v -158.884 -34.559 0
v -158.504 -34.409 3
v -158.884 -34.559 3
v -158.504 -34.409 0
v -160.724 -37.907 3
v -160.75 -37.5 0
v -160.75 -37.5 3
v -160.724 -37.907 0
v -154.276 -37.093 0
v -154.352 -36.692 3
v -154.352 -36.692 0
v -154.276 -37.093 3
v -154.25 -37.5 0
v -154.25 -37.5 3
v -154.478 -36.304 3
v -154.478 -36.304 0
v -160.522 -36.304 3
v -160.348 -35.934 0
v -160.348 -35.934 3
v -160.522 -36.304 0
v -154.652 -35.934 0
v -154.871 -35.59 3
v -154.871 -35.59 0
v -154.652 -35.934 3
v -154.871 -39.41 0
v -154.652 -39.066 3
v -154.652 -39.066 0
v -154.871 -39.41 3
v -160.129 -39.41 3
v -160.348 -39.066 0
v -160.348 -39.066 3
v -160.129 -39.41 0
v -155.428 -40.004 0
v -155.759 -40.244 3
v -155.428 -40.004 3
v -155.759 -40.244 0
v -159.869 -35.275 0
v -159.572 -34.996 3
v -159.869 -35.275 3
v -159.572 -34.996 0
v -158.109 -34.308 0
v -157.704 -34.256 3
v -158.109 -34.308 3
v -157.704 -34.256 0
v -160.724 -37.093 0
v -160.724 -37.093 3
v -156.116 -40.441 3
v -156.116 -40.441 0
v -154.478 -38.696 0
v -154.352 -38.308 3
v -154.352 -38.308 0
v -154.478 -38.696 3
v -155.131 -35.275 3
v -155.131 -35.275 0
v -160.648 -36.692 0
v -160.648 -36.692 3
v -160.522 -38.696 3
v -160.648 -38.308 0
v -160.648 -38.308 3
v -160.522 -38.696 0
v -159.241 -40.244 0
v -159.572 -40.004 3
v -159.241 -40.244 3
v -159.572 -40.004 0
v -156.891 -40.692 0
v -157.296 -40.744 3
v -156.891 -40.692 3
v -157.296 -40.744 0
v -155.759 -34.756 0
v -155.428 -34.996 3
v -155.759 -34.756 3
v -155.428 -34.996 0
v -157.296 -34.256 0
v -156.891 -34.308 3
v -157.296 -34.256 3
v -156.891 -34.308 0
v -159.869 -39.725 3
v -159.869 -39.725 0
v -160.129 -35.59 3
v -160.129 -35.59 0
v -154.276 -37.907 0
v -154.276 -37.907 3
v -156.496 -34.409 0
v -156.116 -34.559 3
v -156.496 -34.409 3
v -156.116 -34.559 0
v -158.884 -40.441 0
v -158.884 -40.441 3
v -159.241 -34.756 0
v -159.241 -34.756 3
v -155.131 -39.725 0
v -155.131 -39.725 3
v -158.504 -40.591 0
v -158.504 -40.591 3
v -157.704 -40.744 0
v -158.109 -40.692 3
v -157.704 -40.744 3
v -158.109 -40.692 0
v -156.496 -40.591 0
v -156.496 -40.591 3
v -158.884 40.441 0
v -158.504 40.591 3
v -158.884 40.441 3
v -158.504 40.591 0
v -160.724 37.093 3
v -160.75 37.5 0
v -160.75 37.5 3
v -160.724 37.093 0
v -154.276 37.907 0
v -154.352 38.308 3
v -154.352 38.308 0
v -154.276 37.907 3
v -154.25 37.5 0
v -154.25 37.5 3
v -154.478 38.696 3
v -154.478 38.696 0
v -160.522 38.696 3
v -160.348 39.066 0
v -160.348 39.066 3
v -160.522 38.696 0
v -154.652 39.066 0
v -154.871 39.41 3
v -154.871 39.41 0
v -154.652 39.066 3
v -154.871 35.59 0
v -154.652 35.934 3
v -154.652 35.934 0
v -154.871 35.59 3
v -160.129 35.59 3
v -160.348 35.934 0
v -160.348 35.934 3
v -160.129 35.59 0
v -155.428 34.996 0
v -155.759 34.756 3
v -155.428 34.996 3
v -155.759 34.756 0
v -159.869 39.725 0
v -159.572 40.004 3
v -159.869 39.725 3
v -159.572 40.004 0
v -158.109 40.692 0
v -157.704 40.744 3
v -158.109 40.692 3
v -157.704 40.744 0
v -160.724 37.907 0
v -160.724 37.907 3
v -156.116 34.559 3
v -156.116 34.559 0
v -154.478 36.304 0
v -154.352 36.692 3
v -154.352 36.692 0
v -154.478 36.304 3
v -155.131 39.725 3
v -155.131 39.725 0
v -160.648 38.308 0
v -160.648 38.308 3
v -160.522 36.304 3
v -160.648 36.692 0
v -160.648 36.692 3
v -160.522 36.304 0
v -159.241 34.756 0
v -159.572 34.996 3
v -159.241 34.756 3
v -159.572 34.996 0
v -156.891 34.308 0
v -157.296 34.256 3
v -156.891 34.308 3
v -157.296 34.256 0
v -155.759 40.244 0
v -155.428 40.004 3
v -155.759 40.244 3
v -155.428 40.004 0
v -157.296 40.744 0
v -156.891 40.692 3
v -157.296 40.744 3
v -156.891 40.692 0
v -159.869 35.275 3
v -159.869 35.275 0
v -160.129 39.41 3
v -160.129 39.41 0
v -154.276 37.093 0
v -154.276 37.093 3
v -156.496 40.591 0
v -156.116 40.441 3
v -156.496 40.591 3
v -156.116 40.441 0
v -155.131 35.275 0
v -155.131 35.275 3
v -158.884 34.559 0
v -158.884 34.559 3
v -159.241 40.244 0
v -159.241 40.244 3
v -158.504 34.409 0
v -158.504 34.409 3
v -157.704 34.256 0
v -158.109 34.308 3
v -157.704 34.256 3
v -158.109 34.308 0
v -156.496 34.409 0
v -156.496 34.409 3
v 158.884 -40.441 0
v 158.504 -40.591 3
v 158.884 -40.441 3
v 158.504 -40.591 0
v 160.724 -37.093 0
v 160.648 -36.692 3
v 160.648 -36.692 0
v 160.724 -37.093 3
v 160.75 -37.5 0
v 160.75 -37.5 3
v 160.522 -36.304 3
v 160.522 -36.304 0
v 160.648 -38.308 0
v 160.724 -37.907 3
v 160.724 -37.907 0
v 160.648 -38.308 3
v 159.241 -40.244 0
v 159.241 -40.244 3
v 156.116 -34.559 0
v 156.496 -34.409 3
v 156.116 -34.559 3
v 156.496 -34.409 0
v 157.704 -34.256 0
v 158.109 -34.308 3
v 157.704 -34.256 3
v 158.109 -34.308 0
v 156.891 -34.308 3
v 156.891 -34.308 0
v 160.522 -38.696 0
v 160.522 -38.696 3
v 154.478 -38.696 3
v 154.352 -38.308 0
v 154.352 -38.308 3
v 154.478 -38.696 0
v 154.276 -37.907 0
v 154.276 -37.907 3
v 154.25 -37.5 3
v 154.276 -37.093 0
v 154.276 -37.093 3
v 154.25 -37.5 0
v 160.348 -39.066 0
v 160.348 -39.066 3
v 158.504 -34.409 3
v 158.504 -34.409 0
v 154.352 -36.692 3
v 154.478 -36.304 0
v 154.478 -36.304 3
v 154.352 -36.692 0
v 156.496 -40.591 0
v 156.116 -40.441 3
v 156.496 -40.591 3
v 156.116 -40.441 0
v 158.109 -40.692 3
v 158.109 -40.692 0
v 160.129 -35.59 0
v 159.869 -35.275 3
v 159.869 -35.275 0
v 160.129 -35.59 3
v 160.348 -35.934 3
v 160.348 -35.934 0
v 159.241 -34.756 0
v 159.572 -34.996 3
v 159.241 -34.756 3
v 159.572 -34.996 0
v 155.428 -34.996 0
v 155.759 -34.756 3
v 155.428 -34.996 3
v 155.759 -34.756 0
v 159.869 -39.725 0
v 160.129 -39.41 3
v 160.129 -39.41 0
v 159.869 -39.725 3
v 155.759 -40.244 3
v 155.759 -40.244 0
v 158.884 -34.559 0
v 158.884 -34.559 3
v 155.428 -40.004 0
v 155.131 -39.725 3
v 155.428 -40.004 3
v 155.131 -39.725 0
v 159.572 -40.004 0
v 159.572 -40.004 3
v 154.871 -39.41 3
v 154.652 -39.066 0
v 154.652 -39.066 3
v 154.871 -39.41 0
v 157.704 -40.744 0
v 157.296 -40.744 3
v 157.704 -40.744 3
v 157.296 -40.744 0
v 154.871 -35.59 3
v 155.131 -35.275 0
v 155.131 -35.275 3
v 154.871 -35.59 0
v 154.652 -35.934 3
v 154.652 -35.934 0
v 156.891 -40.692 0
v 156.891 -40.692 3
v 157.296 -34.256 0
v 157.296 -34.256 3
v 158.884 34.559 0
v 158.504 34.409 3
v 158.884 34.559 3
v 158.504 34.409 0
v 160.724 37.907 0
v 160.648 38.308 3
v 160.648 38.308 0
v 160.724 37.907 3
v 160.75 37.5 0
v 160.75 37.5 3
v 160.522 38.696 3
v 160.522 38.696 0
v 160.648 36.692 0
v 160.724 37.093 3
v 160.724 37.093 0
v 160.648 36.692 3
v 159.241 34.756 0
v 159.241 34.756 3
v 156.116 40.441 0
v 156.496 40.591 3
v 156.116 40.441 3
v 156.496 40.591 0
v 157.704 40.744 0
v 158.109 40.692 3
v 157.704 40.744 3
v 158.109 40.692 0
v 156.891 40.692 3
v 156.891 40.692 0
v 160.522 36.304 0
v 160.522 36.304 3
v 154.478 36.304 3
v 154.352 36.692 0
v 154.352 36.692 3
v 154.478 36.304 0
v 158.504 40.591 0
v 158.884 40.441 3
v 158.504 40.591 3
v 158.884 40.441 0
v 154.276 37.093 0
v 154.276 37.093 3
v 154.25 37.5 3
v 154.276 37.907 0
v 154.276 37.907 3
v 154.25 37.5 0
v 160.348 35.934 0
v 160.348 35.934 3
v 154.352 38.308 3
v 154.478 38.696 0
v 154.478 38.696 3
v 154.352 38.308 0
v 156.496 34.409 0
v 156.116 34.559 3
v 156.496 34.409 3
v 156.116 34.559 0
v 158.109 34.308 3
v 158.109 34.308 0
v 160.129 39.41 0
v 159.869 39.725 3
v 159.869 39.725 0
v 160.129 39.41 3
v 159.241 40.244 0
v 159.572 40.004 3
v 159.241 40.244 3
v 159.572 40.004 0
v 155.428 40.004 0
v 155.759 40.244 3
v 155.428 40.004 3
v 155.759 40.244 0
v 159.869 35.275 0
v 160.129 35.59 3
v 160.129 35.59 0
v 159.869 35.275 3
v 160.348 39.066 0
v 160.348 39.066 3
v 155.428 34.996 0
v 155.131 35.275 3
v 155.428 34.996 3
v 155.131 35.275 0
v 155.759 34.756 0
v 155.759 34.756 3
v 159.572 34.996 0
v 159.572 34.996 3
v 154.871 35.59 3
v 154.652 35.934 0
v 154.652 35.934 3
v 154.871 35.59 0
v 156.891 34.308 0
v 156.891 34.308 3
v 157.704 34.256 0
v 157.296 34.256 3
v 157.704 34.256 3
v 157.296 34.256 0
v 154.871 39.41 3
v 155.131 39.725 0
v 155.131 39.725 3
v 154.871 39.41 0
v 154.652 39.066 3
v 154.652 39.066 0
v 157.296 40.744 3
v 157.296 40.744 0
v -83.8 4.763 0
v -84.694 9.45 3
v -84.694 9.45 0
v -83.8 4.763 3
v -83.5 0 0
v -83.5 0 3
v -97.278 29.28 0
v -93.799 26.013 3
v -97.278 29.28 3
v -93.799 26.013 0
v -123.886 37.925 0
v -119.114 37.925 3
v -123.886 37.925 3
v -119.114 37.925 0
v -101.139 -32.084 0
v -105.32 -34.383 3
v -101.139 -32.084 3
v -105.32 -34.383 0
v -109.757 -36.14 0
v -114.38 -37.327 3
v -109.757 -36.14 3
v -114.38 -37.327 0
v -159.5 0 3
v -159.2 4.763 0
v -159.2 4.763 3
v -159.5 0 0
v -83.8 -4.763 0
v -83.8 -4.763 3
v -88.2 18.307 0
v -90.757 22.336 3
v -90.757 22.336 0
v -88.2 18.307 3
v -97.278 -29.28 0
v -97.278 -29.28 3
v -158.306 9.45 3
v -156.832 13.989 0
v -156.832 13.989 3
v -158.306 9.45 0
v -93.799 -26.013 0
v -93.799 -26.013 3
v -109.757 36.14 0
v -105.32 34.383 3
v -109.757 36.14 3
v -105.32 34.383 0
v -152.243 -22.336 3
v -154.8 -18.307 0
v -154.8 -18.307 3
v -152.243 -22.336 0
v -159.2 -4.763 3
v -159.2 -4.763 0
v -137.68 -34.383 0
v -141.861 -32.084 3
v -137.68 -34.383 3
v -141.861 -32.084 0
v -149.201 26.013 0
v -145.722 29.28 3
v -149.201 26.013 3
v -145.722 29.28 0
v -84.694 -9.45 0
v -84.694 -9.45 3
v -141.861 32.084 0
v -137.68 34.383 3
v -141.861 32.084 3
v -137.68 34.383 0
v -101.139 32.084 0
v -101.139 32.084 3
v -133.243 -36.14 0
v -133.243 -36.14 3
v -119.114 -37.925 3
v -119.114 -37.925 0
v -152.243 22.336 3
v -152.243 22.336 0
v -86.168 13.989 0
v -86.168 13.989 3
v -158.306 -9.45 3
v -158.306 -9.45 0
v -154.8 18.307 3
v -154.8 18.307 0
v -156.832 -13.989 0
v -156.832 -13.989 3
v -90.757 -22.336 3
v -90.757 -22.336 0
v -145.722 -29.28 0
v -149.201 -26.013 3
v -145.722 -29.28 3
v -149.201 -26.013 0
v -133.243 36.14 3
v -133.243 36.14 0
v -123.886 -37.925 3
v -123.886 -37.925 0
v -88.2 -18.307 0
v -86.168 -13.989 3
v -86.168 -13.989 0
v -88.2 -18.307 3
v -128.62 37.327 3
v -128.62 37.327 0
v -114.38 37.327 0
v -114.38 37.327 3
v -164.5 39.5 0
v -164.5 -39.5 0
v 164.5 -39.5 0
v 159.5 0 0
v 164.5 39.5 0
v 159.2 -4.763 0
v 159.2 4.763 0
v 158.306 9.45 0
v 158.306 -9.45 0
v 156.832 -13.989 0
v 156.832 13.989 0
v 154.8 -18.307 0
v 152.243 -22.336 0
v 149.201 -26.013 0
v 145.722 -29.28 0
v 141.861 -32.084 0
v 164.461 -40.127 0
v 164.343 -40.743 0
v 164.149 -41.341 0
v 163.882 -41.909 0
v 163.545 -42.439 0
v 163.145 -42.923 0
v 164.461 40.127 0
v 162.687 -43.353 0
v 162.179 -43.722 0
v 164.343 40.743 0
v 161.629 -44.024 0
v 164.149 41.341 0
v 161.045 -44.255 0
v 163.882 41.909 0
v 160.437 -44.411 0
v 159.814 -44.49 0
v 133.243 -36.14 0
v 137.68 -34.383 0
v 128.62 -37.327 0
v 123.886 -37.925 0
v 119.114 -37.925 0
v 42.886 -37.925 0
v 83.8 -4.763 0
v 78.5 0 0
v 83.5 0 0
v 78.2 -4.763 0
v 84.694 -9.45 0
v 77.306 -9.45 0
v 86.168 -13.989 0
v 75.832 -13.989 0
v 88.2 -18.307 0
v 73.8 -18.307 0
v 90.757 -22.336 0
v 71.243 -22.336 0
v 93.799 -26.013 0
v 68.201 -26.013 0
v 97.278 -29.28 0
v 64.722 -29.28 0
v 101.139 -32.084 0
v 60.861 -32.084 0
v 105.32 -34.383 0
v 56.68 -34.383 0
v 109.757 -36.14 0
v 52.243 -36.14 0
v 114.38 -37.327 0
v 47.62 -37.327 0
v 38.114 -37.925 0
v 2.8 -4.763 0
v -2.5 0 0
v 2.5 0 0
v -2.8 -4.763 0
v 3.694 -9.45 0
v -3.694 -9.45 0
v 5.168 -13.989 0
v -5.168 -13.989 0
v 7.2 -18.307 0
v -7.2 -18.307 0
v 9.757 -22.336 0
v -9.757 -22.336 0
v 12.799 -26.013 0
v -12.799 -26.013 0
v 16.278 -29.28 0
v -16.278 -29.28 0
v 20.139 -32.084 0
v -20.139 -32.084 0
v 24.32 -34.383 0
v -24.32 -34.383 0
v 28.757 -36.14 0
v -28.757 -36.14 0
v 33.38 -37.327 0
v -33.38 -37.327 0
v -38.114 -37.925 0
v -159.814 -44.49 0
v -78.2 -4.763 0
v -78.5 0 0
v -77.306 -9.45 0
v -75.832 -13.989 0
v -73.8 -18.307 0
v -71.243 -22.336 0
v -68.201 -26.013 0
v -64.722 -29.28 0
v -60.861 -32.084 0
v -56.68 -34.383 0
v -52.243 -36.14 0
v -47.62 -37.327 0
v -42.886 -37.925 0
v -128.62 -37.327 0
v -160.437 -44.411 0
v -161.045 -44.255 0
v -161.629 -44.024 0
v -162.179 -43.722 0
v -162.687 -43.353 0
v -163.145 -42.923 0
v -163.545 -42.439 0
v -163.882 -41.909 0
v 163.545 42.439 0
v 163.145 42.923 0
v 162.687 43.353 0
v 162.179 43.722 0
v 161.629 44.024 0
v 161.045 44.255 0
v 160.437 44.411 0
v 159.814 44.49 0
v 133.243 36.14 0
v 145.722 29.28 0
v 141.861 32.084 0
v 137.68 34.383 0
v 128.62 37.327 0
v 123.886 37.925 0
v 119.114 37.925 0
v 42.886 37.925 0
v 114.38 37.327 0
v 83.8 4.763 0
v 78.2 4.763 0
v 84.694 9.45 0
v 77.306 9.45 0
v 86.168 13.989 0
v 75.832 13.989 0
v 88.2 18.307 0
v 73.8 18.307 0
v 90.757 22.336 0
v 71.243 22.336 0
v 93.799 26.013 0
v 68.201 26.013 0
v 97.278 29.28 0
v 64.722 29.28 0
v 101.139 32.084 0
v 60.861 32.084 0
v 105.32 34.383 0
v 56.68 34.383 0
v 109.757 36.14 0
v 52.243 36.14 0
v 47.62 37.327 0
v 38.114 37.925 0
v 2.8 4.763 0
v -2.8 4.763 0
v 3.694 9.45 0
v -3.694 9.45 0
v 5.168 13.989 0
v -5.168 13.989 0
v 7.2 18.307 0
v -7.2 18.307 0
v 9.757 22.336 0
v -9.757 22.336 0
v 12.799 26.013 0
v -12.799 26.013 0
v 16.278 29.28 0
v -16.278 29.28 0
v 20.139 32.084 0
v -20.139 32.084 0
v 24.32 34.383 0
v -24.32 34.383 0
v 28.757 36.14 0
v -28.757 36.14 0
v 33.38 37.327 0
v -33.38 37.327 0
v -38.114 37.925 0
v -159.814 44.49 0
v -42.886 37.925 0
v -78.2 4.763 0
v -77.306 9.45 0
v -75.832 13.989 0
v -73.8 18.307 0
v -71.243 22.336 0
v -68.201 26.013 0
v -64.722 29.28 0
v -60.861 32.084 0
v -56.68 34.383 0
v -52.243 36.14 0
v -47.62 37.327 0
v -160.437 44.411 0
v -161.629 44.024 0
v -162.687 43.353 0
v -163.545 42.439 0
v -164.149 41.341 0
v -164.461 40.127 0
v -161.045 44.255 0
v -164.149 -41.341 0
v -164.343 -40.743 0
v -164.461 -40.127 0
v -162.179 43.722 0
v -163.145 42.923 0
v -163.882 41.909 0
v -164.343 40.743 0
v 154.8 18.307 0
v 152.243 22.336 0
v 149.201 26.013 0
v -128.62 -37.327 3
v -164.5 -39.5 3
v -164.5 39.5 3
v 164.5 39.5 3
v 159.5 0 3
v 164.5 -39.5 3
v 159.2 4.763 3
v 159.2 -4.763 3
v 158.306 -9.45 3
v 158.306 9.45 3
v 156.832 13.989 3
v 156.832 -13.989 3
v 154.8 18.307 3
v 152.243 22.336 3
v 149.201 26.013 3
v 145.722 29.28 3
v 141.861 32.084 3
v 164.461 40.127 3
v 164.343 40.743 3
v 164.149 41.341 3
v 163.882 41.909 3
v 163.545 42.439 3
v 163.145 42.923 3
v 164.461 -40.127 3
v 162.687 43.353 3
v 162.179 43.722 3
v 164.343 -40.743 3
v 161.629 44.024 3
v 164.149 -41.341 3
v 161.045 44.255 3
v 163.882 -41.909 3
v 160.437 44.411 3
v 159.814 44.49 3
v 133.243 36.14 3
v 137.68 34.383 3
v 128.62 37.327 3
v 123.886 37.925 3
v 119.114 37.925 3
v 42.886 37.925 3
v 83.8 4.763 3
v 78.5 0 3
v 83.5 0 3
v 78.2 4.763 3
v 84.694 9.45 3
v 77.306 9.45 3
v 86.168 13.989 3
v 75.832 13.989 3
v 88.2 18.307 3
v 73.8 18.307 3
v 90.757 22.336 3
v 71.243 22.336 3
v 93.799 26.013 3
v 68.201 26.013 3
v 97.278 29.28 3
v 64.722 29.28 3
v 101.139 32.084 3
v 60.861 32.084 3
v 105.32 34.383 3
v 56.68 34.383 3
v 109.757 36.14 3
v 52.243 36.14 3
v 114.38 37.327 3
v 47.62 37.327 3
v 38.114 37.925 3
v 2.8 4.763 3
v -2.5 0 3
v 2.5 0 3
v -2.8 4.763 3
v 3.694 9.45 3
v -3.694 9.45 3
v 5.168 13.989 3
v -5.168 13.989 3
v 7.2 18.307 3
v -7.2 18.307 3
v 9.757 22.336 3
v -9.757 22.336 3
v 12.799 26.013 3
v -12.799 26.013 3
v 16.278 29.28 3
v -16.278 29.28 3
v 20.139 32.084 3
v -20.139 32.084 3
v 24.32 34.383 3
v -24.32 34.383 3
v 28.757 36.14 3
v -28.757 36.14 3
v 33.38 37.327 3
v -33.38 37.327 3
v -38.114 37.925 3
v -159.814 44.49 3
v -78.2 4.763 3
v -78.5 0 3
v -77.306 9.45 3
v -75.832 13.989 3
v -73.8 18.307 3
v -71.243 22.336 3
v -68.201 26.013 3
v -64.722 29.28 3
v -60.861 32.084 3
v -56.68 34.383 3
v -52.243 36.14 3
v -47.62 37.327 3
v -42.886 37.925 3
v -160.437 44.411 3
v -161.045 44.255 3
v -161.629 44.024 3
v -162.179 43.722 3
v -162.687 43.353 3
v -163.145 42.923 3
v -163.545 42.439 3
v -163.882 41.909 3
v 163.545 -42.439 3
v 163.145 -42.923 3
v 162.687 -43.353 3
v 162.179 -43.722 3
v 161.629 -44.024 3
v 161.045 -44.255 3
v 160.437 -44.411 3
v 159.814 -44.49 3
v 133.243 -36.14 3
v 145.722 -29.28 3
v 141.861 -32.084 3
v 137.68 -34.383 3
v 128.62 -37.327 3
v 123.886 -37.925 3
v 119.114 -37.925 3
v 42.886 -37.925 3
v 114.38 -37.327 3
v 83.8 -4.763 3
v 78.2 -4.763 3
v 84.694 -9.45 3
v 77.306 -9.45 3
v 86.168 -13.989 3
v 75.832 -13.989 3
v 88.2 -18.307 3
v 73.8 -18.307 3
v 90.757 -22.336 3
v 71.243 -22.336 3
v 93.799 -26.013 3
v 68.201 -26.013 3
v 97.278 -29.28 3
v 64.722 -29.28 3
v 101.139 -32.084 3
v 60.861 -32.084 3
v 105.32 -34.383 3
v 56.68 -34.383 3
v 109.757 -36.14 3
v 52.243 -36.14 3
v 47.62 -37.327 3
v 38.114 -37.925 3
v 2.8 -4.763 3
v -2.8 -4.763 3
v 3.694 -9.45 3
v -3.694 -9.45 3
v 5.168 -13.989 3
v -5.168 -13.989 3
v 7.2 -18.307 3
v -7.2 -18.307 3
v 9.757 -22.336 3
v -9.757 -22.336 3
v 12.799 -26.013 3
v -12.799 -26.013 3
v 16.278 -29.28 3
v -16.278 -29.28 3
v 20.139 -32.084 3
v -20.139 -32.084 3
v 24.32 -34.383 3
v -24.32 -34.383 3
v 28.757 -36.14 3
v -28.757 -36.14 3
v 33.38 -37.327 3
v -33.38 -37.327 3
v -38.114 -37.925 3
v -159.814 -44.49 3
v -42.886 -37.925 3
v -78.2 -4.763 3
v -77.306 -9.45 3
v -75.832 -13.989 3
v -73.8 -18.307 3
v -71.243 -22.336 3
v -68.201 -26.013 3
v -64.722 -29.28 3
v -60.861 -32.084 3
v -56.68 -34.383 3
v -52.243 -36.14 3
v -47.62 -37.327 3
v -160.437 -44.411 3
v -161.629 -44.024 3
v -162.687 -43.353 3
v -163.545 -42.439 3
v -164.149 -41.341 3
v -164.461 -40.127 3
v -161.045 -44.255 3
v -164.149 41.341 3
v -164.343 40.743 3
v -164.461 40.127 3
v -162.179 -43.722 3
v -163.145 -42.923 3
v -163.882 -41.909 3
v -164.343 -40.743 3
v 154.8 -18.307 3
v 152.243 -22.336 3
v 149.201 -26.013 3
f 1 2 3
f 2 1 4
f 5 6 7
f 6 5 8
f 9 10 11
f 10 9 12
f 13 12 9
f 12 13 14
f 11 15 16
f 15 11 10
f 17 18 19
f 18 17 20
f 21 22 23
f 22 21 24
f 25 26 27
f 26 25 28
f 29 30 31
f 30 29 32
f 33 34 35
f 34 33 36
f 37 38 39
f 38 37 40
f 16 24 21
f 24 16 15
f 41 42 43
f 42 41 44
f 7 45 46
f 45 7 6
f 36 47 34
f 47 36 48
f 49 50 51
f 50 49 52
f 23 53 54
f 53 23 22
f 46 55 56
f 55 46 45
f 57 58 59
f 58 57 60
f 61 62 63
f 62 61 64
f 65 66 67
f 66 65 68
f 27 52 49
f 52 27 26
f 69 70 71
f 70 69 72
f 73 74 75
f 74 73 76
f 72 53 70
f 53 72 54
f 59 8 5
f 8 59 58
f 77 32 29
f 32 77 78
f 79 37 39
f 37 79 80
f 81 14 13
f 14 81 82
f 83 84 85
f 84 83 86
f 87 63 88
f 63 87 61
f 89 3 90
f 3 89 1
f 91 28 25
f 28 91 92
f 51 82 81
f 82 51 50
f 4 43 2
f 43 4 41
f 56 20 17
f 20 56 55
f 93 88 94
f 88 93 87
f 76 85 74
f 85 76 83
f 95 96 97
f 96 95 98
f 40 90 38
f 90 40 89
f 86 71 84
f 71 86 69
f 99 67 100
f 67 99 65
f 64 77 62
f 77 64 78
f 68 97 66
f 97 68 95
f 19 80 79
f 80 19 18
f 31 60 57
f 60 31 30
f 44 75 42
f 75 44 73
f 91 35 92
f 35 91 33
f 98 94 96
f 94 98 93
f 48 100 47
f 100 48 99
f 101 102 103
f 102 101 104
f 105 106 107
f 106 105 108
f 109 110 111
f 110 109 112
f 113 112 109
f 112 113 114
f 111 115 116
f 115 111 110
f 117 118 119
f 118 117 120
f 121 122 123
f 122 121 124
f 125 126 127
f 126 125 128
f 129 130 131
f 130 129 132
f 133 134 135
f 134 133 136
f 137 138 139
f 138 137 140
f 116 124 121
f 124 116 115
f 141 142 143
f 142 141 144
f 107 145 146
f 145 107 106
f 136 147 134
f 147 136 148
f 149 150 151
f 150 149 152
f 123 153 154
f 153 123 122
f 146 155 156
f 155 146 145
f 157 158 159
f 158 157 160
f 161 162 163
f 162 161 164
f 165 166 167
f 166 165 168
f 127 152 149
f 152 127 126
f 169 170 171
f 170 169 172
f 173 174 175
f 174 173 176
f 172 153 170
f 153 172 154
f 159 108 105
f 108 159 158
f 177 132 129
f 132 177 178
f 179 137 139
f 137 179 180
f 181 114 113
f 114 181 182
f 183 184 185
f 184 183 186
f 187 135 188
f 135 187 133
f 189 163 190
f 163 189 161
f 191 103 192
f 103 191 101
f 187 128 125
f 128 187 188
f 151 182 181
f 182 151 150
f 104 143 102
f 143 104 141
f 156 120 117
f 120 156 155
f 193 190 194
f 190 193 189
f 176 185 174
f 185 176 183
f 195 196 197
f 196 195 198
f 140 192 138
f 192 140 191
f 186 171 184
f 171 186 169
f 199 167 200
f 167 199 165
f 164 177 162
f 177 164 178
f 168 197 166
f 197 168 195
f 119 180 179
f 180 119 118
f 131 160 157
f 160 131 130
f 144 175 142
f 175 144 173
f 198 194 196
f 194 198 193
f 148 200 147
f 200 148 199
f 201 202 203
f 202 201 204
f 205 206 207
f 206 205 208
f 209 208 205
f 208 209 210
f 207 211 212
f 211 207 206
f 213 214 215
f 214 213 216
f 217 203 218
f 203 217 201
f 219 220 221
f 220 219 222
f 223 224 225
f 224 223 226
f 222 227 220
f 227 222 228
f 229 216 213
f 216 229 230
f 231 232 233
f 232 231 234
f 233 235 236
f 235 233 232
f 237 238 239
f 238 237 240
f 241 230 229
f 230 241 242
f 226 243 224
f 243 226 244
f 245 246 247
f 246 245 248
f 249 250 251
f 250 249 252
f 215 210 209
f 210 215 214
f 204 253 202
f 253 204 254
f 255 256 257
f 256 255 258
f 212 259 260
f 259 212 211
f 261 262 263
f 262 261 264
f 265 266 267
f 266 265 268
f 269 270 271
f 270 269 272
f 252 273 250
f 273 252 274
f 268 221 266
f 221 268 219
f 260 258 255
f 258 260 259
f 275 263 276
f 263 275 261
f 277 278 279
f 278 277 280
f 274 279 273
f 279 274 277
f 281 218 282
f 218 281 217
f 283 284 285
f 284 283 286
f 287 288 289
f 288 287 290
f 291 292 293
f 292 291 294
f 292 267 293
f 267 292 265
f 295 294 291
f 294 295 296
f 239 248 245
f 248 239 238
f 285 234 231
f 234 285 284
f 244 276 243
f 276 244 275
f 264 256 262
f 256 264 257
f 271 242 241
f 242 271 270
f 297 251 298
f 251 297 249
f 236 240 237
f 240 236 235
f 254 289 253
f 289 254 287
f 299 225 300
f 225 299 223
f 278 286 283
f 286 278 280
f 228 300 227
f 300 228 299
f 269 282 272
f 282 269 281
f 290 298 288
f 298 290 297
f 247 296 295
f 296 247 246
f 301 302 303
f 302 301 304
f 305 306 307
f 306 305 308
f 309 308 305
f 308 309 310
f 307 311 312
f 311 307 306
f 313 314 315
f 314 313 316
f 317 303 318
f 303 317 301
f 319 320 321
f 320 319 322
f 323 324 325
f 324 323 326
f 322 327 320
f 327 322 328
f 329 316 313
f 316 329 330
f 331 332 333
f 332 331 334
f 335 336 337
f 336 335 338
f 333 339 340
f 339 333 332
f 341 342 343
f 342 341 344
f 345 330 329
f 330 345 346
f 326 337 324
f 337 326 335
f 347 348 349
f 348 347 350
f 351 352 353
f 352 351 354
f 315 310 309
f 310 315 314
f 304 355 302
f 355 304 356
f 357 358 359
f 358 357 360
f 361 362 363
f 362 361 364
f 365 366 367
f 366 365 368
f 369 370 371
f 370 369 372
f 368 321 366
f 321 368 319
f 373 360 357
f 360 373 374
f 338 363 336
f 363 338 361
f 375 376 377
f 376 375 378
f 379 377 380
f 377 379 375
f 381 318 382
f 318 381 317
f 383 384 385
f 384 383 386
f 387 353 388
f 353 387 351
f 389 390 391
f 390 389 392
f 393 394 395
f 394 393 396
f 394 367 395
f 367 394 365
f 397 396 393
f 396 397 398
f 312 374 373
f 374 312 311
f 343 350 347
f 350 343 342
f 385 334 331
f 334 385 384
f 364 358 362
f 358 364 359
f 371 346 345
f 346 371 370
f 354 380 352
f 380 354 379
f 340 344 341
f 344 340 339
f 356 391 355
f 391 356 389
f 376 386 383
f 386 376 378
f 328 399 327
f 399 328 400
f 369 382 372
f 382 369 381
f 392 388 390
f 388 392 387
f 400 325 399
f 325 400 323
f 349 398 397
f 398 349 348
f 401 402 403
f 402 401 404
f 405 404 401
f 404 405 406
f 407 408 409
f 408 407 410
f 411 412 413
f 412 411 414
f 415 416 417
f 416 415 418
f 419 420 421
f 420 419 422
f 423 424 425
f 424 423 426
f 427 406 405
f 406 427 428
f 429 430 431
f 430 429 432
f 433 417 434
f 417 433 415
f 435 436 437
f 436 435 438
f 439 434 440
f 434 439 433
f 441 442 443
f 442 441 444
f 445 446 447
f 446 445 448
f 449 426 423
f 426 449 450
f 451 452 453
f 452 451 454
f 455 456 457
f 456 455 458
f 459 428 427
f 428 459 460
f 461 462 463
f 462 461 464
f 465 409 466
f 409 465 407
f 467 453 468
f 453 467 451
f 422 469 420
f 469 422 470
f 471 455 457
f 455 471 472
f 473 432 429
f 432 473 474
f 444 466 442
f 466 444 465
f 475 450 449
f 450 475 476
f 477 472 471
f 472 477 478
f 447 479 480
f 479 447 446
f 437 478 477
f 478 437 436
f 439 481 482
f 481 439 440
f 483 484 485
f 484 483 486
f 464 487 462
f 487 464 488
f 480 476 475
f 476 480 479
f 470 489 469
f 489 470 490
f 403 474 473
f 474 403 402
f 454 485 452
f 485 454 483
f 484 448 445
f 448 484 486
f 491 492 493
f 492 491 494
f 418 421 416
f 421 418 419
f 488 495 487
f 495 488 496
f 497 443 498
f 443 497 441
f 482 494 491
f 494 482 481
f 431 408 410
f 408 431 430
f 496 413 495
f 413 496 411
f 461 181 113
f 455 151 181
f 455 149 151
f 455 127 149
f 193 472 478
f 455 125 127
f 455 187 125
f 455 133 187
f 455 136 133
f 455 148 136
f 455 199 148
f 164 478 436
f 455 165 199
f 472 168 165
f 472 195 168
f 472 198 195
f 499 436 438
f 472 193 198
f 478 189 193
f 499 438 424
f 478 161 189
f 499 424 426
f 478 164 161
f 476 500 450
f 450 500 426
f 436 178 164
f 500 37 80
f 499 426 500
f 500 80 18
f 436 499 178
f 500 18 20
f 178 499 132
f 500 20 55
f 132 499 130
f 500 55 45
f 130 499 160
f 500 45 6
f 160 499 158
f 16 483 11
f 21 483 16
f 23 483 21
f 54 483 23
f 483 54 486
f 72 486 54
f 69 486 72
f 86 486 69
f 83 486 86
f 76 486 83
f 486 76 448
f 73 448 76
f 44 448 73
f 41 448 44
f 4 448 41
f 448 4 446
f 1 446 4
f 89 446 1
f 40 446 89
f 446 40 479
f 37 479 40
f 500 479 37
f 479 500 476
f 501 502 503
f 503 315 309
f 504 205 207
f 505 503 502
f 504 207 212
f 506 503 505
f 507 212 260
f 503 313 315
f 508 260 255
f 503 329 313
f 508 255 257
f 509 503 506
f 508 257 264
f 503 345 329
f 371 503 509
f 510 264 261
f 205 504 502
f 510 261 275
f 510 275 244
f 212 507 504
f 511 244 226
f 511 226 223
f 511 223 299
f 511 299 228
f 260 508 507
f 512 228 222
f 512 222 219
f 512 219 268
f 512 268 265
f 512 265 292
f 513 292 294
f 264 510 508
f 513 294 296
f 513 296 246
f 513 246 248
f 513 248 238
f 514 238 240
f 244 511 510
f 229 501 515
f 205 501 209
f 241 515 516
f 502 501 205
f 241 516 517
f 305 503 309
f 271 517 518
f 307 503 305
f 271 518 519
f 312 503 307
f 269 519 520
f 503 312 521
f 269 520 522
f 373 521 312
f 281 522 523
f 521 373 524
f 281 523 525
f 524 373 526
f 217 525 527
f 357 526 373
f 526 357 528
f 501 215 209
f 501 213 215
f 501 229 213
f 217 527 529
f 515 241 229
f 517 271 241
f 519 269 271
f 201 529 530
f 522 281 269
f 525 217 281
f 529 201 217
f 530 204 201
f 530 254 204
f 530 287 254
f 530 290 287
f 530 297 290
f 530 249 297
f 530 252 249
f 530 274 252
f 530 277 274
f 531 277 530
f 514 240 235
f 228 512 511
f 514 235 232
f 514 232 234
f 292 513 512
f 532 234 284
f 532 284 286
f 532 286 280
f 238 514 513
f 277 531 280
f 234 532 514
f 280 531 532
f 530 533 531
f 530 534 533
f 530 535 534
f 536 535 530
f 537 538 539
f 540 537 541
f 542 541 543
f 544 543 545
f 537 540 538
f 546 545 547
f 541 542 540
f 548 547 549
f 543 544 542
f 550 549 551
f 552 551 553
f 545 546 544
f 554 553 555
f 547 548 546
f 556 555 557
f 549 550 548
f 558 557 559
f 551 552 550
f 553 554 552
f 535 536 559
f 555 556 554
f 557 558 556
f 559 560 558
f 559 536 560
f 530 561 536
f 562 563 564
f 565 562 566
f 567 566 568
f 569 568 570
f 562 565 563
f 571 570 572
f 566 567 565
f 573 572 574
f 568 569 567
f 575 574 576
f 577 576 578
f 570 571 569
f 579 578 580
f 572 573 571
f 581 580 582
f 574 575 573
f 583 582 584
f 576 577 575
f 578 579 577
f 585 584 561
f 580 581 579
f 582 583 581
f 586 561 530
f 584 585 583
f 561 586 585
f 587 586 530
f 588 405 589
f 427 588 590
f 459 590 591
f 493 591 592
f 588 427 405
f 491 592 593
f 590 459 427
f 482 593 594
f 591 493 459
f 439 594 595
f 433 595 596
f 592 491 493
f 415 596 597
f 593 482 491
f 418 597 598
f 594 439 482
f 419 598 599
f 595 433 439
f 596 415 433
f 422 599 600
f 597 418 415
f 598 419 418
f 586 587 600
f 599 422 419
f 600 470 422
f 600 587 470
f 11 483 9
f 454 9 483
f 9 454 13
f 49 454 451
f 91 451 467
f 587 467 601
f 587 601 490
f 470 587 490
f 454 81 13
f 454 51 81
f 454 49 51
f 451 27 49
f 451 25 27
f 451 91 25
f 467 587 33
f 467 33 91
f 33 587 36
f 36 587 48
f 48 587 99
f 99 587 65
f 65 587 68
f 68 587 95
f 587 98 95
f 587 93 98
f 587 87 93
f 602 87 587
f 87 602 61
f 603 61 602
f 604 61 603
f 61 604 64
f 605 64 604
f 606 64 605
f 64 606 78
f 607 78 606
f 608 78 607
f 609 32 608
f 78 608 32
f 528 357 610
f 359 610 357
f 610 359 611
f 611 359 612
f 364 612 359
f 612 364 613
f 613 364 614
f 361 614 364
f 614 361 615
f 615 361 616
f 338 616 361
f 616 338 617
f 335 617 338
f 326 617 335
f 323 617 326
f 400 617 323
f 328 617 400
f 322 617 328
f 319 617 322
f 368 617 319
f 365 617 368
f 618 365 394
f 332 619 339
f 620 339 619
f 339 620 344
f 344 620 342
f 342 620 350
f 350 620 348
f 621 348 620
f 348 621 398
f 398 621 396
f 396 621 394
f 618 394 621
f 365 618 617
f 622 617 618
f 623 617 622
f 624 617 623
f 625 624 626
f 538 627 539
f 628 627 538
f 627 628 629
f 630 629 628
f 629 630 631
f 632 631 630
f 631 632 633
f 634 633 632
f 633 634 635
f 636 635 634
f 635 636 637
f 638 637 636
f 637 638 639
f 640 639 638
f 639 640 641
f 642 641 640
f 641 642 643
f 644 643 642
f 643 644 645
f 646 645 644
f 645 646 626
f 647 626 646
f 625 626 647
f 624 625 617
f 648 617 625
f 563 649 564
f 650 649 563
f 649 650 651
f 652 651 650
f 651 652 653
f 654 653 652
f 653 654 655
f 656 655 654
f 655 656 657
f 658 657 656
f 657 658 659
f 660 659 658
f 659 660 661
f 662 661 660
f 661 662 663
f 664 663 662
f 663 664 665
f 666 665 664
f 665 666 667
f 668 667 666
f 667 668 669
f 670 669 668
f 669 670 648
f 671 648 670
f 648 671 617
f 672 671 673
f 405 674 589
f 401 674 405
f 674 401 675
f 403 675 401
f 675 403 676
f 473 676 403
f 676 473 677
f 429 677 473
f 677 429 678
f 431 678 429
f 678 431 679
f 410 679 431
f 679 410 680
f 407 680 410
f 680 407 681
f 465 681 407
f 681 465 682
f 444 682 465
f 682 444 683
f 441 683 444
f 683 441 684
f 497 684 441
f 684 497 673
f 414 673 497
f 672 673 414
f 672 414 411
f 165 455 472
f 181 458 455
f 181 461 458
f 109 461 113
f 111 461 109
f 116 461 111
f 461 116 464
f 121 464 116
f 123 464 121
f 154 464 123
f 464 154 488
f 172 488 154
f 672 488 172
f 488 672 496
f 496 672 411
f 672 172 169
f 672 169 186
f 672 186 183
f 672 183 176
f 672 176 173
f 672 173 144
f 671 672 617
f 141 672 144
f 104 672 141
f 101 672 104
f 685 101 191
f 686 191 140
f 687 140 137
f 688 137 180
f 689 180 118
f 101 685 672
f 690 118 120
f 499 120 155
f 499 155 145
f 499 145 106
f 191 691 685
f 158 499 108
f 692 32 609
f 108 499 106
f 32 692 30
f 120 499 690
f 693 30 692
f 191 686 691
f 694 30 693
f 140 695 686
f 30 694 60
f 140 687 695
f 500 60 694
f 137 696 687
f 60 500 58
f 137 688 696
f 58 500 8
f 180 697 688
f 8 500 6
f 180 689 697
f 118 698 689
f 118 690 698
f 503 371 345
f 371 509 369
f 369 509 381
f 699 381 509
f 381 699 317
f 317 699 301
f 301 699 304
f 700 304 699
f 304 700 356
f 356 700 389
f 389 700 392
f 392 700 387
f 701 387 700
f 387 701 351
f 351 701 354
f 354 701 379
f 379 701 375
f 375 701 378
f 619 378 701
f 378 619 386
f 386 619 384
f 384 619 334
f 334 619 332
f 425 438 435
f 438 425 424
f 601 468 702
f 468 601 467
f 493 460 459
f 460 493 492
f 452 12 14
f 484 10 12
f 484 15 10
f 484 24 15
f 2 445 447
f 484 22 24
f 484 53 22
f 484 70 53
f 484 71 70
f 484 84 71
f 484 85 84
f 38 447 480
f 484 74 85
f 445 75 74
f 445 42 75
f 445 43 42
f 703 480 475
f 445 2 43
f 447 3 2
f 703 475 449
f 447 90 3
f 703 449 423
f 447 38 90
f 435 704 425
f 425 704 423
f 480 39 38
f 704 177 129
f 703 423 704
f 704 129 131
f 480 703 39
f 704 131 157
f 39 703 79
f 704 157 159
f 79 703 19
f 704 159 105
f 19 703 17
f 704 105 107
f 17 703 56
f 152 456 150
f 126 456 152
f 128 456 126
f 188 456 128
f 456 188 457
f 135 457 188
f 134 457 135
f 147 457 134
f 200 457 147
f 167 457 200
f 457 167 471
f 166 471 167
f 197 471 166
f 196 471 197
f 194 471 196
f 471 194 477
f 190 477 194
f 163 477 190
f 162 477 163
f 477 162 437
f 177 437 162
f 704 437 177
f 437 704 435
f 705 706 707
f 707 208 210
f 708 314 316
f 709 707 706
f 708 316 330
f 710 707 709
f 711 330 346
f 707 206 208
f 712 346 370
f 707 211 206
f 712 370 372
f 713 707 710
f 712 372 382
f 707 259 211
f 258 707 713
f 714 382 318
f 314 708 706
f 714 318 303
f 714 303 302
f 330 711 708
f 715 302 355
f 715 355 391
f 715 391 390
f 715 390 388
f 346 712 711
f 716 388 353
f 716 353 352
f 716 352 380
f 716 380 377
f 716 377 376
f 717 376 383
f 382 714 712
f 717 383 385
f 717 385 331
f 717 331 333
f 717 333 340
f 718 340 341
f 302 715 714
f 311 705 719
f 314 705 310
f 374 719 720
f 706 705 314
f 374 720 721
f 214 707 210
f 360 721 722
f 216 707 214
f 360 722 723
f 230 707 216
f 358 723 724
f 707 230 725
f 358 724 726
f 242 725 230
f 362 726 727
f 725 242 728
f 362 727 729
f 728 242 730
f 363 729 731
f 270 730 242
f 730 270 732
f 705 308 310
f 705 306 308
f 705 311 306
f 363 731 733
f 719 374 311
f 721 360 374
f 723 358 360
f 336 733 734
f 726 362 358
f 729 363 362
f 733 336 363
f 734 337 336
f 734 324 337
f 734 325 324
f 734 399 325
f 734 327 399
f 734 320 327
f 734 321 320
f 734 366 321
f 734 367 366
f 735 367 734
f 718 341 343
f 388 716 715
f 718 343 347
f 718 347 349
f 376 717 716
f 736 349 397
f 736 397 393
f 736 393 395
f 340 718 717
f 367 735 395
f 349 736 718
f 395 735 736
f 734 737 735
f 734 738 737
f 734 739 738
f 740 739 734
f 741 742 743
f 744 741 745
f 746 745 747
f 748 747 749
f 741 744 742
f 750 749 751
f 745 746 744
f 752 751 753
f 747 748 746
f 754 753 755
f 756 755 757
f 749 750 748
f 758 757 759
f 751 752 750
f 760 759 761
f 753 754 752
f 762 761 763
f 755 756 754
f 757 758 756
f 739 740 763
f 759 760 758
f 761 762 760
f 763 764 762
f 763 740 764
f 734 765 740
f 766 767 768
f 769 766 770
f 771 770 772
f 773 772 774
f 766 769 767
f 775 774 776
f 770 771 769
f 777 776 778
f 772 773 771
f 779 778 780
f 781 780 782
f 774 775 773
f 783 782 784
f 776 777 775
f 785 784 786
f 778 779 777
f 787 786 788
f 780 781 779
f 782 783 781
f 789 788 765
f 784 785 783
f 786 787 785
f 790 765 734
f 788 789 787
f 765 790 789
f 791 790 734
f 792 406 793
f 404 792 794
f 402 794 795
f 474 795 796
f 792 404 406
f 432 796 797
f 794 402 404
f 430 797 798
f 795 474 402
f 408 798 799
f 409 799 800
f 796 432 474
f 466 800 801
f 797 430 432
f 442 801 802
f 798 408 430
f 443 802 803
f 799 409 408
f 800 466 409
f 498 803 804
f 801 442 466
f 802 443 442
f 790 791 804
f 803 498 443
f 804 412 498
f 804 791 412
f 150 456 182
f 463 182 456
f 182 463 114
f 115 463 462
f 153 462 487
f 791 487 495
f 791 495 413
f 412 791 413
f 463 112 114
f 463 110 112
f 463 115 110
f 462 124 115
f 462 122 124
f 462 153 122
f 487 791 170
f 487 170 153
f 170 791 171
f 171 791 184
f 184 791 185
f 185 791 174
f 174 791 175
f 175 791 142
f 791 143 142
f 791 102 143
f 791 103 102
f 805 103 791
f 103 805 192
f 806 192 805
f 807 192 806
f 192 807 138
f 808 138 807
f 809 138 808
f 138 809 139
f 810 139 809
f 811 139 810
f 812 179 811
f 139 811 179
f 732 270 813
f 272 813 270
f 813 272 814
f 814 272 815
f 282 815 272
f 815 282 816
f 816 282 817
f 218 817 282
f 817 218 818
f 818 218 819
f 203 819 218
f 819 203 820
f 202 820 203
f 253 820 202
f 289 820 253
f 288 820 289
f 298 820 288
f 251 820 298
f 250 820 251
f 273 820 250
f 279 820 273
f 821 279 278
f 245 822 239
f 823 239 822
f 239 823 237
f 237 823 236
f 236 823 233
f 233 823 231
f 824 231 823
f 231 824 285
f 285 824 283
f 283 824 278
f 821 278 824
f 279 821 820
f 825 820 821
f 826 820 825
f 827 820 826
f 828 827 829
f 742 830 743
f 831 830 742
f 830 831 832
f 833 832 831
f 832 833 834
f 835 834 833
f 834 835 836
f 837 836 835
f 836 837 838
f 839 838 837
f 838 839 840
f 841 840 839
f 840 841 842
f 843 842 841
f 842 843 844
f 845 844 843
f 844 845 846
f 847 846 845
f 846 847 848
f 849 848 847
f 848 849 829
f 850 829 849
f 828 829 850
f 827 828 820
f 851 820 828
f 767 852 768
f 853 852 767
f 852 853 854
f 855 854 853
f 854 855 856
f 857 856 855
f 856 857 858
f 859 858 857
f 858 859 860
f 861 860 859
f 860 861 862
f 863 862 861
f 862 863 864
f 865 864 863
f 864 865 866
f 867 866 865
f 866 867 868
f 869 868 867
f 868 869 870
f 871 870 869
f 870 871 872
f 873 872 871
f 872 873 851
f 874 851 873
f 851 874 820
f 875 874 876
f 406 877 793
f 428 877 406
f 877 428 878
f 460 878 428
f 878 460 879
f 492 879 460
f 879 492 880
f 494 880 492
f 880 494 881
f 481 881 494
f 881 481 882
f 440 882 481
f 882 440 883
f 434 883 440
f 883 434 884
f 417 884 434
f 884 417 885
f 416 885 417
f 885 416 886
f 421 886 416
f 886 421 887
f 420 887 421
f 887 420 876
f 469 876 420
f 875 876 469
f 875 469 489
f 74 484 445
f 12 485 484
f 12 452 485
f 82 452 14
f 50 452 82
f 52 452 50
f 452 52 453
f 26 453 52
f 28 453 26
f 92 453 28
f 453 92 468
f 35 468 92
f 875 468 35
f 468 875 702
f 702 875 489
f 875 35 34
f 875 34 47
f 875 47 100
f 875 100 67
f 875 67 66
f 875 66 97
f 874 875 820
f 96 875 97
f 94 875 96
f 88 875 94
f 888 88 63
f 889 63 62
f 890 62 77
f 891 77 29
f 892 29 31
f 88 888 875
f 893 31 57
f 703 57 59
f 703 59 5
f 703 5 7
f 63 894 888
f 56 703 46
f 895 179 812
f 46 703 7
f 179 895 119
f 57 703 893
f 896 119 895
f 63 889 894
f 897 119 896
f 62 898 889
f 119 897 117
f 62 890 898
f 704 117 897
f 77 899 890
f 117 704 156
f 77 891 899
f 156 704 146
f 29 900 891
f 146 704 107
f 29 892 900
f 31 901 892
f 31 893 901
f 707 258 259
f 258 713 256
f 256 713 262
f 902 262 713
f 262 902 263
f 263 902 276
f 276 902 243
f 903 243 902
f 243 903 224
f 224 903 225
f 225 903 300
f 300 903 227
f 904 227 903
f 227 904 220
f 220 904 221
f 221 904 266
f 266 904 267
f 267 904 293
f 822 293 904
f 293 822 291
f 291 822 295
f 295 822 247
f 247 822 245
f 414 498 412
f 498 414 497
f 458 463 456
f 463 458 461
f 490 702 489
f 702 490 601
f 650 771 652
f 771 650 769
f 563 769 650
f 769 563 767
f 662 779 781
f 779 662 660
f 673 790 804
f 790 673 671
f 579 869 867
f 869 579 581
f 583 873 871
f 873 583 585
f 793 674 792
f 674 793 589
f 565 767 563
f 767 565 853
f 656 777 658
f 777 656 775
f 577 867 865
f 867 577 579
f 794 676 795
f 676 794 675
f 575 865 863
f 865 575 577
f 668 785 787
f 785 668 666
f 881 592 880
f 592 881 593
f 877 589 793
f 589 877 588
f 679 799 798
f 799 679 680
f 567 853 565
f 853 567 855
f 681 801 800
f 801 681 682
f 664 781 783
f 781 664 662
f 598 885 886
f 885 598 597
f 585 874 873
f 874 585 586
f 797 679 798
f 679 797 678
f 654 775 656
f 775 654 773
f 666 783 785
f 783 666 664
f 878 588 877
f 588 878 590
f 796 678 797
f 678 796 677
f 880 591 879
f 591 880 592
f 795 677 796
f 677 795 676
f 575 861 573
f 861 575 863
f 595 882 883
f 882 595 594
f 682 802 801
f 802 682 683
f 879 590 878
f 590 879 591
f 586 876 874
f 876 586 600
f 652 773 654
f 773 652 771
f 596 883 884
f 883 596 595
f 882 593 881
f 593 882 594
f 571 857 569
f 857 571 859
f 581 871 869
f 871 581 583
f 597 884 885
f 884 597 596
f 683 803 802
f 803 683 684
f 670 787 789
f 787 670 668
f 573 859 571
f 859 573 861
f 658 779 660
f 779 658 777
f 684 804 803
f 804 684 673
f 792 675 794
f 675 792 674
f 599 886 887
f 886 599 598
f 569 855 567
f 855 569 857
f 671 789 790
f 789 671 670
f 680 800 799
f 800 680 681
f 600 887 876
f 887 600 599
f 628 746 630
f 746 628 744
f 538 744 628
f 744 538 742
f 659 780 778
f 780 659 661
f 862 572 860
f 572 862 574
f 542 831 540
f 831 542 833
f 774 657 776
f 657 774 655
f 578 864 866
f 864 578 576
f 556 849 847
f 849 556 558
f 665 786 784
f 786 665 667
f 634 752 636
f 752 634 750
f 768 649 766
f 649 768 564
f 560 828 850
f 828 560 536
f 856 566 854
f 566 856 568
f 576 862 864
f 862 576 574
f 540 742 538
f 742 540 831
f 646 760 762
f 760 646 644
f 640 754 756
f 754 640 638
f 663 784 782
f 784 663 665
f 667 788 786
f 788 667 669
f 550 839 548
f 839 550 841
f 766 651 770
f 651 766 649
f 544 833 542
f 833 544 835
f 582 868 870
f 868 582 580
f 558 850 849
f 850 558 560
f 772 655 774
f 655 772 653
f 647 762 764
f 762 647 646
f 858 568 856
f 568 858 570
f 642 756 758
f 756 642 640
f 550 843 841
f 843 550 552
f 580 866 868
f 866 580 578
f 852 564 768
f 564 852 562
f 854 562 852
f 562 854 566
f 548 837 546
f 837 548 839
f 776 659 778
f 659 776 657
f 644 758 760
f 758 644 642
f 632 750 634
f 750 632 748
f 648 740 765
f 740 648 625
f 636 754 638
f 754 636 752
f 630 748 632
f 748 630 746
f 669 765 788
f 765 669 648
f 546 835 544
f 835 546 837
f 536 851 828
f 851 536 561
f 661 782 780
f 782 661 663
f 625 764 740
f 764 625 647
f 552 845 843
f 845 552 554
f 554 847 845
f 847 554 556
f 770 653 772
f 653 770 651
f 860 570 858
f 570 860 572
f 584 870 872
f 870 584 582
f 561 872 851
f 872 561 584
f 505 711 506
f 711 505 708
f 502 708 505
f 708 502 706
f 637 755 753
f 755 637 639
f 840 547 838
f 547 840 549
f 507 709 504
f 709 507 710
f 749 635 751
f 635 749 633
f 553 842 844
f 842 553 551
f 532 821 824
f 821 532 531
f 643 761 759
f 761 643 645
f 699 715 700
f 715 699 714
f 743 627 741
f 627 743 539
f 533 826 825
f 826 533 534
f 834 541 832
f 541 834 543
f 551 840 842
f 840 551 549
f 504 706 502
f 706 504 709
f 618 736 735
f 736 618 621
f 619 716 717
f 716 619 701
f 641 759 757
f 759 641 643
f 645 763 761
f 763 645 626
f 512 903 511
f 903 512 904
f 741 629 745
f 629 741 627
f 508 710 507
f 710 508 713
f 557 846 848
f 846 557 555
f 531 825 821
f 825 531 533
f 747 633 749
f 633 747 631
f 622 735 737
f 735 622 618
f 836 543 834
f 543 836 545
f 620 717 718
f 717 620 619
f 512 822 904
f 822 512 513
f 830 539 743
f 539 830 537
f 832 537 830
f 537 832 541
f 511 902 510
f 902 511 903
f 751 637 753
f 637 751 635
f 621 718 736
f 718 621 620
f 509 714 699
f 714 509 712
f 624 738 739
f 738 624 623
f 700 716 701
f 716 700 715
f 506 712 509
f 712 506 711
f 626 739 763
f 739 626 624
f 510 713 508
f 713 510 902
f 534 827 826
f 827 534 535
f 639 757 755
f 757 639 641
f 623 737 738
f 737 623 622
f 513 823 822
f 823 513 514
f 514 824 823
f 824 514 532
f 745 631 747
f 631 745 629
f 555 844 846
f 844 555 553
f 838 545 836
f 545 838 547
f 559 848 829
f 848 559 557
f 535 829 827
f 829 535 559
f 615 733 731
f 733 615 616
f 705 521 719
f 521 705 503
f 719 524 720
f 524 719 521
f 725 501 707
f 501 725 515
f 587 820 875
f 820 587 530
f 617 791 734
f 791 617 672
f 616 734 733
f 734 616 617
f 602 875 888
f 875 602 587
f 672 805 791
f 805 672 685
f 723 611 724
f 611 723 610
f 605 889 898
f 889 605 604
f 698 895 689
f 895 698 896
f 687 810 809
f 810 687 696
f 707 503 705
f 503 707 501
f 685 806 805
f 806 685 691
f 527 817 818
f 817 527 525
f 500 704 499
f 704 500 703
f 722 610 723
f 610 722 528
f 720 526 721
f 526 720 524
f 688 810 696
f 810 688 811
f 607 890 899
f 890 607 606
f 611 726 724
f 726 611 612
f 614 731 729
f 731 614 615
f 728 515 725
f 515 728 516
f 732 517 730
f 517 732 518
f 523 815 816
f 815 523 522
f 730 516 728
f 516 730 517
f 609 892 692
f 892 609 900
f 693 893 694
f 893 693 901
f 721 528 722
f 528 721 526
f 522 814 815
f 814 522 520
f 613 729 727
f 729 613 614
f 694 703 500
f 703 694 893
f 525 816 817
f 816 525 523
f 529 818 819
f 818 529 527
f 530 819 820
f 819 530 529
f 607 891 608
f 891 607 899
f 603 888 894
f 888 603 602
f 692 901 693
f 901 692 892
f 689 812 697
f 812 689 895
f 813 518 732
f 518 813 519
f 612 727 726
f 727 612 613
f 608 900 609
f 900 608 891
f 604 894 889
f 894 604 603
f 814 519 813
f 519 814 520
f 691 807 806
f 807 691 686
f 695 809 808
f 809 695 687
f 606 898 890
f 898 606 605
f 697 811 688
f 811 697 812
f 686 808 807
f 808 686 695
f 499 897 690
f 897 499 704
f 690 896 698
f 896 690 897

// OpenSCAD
$fn = 50;


difference() {
	union() {
		hull() {
			translate(v = [-159.5000000000, 39.5000000000, 0]) {
				cylinder(h = 3, r = 5);
			}
			translate(v = [159.5000000000, 39.5000000000, 0]) {
				cylinder(h = 3, r = 5);
			}
			translate(v = [-159.5000000000, -39.5000000000, 0]) {
				cylinder(h = 3, r = 5);
			}
			translate(v = [159.5000000000, -39.5000000000, 0]) {
				cylinder(h = 3, r = 5);
			}
		}
	}
	union() {
		#translate(v = [-157.5000000000, -37.5000000000, -100.0000000000]) {
			cylinder(h = 200, r = 3.2500000000);
		}
		#translate(v = [-157.5000000000, 37.5000000000, -100.0000000000]) {
			cylinder(h = 200, r = 3.2500000000);
		}
		#translate(v = [157.5000000000, -37.5000000000, -100.0000000000]) {
			cylinder(h = 200, r = 3.2500000000);
		}
		#translate(v = [157.5000000000, 37.5000000000, -100.0000000000]) {
			cylinder(h = 200, r = 3.2500000000);
		}
		#translate(v = [-121.5000000000, 0, 0]) {
			cylinder(h = 3, r = 38.0000000000);
		}
		#translate(v = [-40.5000000000, 0, 0]) {
			cylinder(h = 3, r = 38.0000000000);
		}
		#translate(v = [40.5000000000, 0, 0]) {
			cylinder(h = 3, r = 38.0000000000);
		}
		#translate(v = [121.5000000000, 0, 0]) {
			cylinder(h = 3, r = 38.0000000000);
		}
	}
}
